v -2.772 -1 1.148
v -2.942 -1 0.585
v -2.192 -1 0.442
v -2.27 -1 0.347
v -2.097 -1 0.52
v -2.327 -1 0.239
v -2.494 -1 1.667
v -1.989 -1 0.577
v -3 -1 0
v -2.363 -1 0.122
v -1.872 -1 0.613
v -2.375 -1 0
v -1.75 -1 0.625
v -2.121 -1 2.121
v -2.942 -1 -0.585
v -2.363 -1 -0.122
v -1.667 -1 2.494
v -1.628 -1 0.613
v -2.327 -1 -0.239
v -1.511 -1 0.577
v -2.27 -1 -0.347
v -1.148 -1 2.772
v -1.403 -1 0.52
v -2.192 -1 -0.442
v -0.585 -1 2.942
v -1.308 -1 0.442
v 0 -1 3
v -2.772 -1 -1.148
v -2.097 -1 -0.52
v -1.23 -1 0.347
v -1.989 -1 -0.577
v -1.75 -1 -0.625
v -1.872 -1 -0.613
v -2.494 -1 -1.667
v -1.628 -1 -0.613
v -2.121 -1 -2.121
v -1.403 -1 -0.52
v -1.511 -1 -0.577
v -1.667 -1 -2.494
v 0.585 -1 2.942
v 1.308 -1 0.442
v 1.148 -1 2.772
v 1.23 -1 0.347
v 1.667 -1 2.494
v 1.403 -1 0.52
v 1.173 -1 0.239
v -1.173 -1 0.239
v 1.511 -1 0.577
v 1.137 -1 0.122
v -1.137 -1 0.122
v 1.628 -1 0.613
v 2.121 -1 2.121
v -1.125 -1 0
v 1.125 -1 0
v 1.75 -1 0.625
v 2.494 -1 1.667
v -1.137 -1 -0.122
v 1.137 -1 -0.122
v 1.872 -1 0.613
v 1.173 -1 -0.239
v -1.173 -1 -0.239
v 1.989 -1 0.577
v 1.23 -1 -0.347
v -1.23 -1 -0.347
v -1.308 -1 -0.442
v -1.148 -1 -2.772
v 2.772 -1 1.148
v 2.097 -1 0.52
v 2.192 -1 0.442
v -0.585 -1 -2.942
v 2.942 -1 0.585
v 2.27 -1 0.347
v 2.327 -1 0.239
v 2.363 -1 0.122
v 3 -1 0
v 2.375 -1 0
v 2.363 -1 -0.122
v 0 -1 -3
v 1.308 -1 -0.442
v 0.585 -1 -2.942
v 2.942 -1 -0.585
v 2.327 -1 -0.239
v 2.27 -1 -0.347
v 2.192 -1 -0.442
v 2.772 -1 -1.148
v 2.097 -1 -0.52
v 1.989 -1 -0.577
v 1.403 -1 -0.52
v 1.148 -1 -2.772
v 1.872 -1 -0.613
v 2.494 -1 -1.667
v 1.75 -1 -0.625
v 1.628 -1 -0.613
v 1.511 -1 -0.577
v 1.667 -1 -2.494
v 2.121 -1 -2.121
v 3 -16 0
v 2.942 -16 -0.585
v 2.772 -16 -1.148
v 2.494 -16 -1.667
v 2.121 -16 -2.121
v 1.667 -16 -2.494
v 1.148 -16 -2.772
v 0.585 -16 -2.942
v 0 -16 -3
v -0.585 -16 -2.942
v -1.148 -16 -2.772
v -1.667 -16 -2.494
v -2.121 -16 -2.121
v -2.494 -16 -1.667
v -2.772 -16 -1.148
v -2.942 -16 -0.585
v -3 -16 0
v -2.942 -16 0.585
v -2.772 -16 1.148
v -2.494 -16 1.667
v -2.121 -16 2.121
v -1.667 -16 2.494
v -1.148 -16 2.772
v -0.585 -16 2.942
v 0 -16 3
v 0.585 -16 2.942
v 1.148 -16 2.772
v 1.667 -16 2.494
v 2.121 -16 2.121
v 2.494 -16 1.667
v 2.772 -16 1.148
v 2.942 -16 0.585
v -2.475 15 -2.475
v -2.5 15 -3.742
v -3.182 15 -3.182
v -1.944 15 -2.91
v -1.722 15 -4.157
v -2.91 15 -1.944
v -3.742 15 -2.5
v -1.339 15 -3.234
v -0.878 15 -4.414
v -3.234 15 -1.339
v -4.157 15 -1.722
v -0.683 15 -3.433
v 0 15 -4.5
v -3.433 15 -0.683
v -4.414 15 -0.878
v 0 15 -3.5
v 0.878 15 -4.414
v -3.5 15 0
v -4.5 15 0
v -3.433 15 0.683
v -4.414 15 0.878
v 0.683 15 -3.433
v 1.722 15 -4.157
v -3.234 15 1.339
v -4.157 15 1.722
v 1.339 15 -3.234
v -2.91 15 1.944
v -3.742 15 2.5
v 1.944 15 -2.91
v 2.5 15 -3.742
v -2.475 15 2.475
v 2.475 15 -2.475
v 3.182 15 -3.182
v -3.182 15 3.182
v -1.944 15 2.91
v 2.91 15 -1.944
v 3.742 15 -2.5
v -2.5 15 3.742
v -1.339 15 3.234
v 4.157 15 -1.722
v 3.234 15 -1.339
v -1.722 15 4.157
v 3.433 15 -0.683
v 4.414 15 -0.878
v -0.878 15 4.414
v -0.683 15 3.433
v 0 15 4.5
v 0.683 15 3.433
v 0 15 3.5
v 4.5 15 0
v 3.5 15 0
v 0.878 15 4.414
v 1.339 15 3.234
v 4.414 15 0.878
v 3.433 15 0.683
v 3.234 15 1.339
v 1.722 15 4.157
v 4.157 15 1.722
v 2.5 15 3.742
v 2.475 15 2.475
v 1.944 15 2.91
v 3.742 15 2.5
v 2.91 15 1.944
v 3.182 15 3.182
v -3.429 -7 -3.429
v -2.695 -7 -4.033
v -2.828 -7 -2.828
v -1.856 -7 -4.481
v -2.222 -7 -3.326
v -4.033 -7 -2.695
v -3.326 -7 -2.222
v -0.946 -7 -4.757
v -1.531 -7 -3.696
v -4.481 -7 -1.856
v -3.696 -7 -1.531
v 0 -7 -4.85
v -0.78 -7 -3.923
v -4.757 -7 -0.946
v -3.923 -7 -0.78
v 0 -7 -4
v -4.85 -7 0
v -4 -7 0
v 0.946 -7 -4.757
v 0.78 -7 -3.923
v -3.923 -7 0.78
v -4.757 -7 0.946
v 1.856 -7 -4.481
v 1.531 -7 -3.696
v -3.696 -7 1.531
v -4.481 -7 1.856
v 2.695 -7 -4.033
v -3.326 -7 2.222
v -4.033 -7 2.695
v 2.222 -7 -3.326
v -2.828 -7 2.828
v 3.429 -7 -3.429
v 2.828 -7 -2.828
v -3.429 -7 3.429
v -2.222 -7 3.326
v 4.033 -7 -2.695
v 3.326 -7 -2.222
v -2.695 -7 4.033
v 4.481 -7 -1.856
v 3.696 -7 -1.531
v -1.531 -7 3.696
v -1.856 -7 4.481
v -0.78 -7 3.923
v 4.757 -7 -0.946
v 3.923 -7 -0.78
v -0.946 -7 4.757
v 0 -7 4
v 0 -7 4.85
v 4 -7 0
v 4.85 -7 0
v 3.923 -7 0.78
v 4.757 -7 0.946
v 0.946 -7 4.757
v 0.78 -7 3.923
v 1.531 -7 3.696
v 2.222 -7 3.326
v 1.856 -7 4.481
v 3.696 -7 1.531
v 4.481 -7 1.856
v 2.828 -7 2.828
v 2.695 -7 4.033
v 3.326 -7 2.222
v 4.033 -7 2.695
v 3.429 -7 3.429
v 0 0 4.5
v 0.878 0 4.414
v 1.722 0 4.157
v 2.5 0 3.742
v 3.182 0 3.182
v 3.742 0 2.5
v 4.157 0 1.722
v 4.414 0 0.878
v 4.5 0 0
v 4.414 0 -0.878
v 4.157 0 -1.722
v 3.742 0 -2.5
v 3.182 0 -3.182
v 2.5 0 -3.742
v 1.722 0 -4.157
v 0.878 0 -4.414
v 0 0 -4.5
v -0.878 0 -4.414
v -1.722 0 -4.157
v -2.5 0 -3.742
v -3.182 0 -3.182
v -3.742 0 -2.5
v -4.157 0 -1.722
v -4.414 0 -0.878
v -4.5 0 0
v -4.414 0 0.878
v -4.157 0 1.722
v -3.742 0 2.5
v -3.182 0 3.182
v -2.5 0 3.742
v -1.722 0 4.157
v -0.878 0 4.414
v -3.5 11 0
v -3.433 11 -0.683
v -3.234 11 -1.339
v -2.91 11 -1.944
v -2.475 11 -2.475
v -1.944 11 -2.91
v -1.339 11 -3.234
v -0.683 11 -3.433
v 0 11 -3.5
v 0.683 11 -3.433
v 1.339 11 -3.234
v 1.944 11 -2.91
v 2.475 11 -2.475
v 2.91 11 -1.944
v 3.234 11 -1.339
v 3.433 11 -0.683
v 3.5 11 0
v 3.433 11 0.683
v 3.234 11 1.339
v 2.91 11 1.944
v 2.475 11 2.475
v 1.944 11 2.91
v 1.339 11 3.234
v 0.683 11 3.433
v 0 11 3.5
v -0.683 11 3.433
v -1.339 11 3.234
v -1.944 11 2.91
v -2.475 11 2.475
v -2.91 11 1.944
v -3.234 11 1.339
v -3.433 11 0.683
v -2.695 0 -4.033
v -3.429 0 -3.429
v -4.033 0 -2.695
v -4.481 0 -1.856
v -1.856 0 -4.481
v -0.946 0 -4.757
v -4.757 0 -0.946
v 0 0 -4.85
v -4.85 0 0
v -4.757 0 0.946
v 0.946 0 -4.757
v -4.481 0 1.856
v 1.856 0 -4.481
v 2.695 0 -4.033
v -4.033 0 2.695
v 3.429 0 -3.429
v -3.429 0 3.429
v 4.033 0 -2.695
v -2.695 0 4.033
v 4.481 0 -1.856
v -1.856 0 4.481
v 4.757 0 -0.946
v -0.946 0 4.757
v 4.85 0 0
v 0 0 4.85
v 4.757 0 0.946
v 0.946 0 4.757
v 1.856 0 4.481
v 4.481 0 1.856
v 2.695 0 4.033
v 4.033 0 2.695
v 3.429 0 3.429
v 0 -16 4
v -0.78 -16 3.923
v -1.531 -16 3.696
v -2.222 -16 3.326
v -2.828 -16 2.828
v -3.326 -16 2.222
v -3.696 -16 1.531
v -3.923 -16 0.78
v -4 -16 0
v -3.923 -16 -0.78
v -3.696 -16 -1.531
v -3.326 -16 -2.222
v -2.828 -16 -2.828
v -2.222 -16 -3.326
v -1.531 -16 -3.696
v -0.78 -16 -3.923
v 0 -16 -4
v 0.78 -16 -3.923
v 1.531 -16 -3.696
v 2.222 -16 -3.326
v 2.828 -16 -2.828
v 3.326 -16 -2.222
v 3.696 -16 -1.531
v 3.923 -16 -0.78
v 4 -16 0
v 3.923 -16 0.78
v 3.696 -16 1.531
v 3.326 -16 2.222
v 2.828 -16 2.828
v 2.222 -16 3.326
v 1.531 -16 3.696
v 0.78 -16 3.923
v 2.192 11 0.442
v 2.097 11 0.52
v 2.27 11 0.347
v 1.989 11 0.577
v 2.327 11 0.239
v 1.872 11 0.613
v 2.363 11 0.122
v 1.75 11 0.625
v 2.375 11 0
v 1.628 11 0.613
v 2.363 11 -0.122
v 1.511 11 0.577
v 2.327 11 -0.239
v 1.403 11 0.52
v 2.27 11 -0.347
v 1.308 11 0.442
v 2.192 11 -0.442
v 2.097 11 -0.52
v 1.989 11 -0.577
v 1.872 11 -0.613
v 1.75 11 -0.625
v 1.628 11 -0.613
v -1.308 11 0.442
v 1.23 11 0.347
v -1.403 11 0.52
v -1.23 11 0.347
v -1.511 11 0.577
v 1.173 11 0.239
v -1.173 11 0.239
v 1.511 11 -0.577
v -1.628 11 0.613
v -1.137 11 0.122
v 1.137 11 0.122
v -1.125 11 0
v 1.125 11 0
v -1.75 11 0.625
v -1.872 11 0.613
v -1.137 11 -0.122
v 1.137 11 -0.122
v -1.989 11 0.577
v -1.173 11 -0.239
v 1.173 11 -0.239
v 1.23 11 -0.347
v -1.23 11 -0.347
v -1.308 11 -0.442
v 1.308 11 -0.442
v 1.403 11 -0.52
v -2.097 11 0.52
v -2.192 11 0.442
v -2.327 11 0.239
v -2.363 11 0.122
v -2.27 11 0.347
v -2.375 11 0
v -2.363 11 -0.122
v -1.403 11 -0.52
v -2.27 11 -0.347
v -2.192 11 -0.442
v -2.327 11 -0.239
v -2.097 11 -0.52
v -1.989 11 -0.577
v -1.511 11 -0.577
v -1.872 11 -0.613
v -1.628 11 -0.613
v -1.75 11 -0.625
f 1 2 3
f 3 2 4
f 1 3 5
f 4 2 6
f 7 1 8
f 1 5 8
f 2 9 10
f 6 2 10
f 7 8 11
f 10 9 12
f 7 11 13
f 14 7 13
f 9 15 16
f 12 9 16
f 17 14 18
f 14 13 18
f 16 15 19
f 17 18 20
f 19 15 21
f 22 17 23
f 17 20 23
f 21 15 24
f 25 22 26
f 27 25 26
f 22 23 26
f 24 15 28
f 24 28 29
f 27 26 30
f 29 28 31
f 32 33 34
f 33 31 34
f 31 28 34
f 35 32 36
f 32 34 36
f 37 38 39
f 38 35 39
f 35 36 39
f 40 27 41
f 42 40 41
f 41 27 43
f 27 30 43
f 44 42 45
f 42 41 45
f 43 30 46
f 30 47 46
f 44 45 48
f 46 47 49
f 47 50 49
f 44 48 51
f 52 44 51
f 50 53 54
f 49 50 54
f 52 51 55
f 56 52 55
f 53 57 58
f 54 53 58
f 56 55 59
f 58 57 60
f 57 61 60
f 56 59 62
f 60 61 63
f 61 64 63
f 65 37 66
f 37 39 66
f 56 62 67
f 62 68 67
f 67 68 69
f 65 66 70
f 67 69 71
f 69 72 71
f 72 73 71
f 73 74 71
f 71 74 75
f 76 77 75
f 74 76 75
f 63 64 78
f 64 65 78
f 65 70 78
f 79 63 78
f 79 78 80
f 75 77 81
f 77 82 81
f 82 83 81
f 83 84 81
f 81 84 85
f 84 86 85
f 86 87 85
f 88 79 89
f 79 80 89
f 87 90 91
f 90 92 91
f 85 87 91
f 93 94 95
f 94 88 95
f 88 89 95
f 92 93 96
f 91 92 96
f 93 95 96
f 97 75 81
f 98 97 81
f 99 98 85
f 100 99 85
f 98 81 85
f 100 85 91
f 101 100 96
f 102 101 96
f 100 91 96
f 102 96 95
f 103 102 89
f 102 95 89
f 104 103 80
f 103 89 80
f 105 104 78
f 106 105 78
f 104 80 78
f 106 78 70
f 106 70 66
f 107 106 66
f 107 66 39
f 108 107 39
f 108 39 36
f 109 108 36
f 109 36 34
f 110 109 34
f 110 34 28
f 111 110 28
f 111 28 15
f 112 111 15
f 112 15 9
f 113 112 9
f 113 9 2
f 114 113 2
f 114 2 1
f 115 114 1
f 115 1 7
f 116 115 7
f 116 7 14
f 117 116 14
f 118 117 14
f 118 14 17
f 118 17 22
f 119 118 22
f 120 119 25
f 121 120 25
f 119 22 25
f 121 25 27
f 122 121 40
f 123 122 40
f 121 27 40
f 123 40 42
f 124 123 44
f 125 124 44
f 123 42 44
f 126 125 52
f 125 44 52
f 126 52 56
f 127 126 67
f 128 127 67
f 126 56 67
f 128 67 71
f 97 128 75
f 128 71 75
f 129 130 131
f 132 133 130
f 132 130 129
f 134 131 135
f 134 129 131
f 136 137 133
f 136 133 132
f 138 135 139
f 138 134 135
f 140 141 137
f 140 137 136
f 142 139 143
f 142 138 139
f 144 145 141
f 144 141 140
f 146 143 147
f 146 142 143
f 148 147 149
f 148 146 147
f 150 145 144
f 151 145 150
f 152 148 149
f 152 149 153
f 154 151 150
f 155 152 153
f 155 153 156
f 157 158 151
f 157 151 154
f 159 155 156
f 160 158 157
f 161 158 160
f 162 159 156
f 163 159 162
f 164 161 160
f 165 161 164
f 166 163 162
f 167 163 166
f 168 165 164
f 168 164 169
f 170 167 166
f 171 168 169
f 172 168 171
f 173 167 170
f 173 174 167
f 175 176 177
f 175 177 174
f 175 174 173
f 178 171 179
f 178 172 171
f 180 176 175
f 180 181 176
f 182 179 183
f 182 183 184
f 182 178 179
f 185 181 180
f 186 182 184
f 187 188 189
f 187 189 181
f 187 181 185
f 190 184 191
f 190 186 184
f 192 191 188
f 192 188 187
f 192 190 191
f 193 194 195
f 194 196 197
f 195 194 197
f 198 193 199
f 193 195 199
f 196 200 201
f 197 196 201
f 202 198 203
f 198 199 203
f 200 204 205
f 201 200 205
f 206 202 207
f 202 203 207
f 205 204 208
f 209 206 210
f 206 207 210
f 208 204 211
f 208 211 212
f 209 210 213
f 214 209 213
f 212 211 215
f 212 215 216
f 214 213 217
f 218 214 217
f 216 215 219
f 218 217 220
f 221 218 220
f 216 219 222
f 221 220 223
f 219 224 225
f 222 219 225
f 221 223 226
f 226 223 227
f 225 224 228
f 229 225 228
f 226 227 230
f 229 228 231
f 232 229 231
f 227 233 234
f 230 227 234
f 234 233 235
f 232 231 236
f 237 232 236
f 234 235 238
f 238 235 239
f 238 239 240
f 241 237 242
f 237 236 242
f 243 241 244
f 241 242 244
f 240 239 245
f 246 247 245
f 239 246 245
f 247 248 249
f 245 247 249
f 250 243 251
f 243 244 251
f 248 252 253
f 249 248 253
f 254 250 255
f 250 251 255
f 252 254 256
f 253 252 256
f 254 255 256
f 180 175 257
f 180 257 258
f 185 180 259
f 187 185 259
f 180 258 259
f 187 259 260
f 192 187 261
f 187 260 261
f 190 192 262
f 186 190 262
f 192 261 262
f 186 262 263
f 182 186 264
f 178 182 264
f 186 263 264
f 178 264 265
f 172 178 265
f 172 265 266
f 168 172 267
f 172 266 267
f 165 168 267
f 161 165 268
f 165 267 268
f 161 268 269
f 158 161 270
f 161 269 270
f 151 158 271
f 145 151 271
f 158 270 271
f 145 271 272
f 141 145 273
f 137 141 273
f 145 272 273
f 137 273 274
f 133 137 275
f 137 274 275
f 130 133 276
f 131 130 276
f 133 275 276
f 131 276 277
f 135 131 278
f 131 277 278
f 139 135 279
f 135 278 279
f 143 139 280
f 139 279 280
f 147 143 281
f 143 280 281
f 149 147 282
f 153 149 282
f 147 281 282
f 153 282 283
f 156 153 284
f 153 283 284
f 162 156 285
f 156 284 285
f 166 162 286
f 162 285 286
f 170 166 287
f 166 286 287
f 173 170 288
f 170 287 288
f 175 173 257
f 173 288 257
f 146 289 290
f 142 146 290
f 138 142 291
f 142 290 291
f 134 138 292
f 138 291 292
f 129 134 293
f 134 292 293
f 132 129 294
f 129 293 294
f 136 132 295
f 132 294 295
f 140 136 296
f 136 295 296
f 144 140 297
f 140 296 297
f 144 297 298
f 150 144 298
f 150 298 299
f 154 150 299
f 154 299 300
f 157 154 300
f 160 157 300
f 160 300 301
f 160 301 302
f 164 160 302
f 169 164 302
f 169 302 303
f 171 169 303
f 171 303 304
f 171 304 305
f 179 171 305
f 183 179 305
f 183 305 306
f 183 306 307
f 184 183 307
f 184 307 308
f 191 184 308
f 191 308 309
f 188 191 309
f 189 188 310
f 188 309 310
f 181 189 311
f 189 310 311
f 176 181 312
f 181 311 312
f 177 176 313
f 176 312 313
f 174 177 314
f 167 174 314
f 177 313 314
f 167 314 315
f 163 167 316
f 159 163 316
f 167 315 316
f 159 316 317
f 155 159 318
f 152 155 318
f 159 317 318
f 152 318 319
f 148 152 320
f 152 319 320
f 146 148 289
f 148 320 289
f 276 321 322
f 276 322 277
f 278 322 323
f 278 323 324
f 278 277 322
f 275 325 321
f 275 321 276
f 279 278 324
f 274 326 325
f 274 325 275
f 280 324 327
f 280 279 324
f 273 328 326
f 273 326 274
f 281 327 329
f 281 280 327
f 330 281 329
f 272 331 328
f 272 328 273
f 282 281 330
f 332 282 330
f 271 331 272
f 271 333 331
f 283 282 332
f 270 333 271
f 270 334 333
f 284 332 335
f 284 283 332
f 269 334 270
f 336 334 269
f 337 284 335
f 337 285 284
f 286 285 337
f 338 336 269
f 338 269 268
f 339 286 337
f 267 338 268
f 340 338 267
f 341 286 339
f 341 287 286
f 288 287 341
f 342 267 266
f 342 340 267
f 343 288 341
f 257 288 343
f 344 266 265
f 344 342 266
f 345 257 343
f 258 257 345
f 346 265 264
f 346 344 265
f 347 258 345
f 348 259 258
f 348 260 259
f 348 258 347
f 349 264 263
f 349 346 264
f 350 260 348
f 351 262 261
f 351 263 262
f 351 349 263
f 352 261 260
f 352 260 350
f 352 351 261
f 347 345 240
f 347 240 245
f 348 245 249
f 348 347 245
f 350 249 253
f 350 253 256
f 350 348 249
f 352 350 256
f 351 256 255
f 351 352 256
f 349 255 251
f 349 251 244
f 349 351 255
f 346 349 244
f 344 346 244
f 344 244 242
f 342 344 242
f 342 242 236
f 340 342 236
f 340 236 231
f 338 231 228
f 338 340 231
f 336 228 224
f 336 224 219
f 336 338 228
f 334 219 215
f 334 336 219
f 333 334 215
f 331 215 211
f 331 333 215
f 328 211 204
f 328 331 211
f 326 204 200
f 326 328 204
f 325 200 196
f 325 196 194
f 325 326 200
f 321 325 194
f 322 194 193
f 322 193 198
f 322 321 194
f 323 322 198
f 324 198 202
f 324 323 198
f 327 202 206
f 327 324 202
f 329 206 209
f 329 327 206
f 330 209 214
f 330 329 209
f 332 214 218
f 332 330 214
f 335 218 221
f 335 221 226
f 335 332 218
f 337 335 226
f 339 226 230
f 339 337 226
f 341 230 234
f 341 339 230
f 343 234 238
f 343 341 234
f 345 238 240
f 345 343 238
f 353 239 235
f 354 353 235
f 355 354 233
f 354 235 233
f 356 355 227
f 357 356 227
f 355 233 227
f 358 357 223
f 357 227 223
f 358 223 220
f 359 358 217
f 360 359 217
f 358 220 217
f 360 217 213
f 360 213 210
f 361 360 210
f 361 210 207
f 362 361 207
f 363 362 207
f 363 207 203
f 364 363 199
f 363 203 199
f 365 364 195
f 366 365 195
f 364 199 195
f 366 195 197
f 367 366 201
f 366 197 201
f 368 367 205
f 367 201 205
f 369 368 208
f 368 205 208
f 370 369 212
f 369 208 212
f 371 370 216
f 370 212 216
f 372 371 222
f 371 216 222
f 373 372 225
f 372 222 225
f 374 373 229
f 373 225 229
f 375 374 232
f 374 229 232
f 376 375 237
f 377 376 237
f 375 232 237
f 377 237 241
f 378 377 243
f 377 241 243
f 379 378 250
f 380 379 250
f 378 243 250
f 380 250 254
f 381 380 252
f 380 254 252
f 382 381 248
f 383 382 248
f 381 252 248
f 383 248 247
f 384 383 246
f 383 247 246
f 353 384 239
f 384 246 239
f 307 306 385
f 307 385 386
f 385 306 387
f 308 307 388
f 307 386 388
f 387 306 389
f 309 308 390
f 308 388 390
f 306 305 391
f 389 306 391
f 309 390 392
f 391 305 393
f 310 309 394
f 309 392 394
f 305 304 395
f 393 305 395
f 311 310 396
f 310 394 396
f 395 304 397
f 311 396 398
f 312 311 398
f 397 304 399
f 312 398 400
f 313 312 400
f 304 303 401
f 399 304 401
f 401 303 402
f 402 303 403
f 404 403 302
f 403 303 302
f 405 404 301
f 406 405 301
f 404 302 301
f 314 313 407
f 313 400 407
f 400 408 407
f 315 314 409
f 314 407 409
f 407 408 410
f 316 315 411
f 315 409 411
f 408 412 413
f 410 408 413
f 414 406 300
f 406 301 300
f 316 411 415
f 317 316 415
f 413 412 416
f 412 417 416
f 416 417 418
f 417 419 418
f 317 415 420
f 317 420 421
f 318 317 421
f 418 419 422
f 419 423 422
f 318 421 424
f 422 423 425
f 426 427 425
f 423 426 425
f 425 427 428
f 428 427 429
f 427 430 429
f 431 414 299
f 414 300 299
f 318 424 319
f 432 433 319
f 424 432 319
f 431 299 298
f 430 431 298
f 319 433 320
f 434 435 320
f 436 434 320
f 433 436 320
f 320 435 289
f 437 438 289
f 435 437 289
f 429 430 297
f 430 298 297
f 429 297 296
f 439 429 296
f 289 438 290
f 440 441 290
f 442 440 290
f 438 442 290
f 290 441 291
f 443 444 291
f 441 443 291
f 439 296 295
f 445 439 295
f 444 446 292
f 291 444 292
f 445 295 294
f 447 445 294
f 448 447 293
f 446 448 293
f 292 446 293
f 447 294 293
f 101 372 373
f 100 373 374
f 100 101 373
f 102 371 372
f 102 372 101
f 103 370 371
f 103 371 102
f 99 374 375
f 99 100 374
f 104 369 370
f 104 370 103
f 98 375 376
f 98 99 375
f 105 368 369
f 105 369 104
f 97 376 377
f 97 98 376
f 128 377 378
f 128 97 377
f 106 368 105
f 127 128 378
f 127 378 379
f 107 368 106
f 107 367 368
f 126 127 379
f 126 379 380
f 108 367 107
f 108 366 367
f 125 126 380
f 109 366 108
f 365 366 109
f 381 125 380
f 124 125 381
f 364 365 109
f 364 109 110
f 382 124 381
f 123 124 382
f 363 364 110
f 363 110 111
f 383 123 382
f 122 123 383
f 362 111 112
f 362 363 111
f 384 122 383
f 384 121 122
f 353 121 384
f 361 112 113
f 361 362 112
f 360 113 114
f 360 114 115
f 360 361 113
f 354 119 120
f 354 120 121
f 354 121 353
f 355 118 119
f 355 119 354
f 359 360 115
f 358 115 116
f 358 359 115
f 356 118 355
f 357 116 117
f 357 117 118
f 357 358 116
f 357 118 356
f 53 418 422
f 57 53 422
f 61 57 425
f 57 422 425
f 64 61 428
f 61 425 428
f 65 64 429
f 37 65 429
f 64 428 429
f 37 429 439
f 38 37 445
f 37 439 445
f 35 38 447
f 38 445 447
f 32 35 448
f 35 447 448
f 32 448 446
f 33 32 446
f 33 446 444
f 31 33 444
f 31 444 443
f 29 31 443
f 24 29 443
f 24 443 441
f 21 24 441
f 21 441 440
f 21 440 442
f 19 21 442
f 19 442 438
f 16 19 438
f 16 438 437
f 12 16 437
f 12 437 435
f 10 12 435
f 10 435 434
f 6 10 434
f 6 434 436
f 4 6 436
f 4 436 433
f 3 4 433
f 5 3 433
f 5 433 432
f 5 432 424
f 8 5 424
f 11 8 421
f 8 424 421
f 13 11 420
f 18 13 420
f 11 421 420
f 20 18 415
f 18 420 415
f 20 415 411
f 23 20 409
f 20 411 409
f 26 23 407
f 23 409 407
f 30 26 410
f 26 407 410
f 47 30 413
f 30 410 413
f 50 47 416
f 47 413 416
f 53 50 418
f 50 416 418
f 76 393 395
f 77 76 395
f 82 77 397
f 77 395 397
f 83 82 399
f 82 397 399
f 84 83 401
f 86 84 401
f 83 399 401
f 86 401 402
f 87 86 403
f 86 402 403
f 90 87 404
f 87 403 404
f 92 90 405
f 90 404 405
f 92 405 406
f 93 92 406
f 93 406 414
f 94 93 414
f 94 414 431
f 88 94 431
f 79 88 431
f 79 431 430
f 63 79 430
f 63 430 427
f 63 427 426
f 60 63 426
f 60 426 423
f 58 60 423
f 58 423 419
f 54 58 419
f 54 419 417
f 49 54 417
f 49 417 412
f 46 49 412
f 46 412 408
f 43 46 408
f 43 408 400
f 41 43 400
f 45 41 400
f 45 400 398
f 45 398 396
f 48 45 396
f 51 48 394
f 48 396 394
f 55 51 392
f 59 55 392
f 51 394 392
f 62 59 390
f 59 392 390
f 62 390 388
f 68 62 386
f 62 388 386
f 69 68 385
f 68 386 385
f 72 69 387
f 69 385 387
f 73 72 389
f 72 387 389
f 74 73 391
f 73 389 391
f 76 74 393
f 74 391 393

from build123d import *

# Parameters (mm, degrees)
SKETCH1_R                          = 4.5
BOSS_EXTRUDE1_DEPTH                = 15
F_6_0MM_DOWEL_HOLE1_D              = 7
F_6_0MM_DOWEL_HOLE1_DEPTH          = 4
SKETCH5_R                          = 4.85
BOSS_EXTRUDE2_DEPTH                = 7
SKETCH6_R                          = 4
BOSS_EXTRUDE3_DEPTH                = 9
F_6_0MM_DOWEL_HOLE2_D              = 6
F_6_0MM_DOWEL_HOLE2_DEPTH          = 15
TAP_DRILL_FOR_M1_6X0_35_TAP3_D     = 1.25
TAP_DRILL_FOR_M1_6X0_35_TAP3_DEPTH = 41


with BuildPart() as part:
    # Sketch1 → Boss-Extrude1 (new body)
    with BuildSketch(Plane(origin=(0, 0, 0), x_dir=(1, 0, 0), z_dir=(0, 1, 0))):
        with Locations(Location((0, 0, 0), (0, 0, 270))):
            Circle(SKETCH1_R)
    extrude(amount=BOSS_EXTRUDE1_DEPTH)

    # Ø6.0mm Dowel Hole1
    with Locations(Plane(origin=(0, 15, 0), x_dir=(1, 0, 0), z_dir=(0, 1, 0))):
        with Locations((0, 0)):
            Hole(F_6_0MM_DOWEL_HOLE1_D / 2, depth=F_6_0MM_DOWEL_HOLE1_DEPTH)

    # Sketch5 → Boss-Extrude2 (add)
    with BuildSketch(Plane(origin=(0, 0, 0), x_dir=(1, 0, 0), z_dir=(0, 1, 0))):
        with Locations(Location((0, 0, 0), (0, 0, 270))):
            Circle(SKETCH5_R)
    extrude(amount=-BOSS_EXTRUDE2_DEPTH)

    # Sketch6 → Boss-Extrude3 (add)
    with BuildSketch(Plane.XZ.offset(7)):
        with Locations(Location((0, 0, 0), (0, 0, 90))):
            Circle(SKETCH6_R)
    extrude(amount=BOSS_EXTRUDE3_DEPTH)

    # Ø6.0mm Dowel Hole2
    with Locations(Plane(origin=(0, -16, 0), x_dir=(-1, 0, 0), z_dir=(0, -1, 0))):
        with Locations((0, 0)):
            Hole(F_6_0MM_DOWEL_HOLE2_D / 2, depth=F_6_0MM_DOWEL_HOLE2_DEPTH)

    # Tap Drill for M1.6x0.35 Tap3
    with Locations(Plane(origin=(0, -1, 0), x_dir=(-1, 0, 0), z_dir=(0, -1, 0))):
        with Locations((1.75, 0), (-1.75, 0)):
            Hole(TAP_DRILL_FOR_M1_6X0_35_TAP3_D / 2, depth=TAP_DRILL_FOR_M1_6X0_35_TAP3_DEPTH)


solid = part.part
